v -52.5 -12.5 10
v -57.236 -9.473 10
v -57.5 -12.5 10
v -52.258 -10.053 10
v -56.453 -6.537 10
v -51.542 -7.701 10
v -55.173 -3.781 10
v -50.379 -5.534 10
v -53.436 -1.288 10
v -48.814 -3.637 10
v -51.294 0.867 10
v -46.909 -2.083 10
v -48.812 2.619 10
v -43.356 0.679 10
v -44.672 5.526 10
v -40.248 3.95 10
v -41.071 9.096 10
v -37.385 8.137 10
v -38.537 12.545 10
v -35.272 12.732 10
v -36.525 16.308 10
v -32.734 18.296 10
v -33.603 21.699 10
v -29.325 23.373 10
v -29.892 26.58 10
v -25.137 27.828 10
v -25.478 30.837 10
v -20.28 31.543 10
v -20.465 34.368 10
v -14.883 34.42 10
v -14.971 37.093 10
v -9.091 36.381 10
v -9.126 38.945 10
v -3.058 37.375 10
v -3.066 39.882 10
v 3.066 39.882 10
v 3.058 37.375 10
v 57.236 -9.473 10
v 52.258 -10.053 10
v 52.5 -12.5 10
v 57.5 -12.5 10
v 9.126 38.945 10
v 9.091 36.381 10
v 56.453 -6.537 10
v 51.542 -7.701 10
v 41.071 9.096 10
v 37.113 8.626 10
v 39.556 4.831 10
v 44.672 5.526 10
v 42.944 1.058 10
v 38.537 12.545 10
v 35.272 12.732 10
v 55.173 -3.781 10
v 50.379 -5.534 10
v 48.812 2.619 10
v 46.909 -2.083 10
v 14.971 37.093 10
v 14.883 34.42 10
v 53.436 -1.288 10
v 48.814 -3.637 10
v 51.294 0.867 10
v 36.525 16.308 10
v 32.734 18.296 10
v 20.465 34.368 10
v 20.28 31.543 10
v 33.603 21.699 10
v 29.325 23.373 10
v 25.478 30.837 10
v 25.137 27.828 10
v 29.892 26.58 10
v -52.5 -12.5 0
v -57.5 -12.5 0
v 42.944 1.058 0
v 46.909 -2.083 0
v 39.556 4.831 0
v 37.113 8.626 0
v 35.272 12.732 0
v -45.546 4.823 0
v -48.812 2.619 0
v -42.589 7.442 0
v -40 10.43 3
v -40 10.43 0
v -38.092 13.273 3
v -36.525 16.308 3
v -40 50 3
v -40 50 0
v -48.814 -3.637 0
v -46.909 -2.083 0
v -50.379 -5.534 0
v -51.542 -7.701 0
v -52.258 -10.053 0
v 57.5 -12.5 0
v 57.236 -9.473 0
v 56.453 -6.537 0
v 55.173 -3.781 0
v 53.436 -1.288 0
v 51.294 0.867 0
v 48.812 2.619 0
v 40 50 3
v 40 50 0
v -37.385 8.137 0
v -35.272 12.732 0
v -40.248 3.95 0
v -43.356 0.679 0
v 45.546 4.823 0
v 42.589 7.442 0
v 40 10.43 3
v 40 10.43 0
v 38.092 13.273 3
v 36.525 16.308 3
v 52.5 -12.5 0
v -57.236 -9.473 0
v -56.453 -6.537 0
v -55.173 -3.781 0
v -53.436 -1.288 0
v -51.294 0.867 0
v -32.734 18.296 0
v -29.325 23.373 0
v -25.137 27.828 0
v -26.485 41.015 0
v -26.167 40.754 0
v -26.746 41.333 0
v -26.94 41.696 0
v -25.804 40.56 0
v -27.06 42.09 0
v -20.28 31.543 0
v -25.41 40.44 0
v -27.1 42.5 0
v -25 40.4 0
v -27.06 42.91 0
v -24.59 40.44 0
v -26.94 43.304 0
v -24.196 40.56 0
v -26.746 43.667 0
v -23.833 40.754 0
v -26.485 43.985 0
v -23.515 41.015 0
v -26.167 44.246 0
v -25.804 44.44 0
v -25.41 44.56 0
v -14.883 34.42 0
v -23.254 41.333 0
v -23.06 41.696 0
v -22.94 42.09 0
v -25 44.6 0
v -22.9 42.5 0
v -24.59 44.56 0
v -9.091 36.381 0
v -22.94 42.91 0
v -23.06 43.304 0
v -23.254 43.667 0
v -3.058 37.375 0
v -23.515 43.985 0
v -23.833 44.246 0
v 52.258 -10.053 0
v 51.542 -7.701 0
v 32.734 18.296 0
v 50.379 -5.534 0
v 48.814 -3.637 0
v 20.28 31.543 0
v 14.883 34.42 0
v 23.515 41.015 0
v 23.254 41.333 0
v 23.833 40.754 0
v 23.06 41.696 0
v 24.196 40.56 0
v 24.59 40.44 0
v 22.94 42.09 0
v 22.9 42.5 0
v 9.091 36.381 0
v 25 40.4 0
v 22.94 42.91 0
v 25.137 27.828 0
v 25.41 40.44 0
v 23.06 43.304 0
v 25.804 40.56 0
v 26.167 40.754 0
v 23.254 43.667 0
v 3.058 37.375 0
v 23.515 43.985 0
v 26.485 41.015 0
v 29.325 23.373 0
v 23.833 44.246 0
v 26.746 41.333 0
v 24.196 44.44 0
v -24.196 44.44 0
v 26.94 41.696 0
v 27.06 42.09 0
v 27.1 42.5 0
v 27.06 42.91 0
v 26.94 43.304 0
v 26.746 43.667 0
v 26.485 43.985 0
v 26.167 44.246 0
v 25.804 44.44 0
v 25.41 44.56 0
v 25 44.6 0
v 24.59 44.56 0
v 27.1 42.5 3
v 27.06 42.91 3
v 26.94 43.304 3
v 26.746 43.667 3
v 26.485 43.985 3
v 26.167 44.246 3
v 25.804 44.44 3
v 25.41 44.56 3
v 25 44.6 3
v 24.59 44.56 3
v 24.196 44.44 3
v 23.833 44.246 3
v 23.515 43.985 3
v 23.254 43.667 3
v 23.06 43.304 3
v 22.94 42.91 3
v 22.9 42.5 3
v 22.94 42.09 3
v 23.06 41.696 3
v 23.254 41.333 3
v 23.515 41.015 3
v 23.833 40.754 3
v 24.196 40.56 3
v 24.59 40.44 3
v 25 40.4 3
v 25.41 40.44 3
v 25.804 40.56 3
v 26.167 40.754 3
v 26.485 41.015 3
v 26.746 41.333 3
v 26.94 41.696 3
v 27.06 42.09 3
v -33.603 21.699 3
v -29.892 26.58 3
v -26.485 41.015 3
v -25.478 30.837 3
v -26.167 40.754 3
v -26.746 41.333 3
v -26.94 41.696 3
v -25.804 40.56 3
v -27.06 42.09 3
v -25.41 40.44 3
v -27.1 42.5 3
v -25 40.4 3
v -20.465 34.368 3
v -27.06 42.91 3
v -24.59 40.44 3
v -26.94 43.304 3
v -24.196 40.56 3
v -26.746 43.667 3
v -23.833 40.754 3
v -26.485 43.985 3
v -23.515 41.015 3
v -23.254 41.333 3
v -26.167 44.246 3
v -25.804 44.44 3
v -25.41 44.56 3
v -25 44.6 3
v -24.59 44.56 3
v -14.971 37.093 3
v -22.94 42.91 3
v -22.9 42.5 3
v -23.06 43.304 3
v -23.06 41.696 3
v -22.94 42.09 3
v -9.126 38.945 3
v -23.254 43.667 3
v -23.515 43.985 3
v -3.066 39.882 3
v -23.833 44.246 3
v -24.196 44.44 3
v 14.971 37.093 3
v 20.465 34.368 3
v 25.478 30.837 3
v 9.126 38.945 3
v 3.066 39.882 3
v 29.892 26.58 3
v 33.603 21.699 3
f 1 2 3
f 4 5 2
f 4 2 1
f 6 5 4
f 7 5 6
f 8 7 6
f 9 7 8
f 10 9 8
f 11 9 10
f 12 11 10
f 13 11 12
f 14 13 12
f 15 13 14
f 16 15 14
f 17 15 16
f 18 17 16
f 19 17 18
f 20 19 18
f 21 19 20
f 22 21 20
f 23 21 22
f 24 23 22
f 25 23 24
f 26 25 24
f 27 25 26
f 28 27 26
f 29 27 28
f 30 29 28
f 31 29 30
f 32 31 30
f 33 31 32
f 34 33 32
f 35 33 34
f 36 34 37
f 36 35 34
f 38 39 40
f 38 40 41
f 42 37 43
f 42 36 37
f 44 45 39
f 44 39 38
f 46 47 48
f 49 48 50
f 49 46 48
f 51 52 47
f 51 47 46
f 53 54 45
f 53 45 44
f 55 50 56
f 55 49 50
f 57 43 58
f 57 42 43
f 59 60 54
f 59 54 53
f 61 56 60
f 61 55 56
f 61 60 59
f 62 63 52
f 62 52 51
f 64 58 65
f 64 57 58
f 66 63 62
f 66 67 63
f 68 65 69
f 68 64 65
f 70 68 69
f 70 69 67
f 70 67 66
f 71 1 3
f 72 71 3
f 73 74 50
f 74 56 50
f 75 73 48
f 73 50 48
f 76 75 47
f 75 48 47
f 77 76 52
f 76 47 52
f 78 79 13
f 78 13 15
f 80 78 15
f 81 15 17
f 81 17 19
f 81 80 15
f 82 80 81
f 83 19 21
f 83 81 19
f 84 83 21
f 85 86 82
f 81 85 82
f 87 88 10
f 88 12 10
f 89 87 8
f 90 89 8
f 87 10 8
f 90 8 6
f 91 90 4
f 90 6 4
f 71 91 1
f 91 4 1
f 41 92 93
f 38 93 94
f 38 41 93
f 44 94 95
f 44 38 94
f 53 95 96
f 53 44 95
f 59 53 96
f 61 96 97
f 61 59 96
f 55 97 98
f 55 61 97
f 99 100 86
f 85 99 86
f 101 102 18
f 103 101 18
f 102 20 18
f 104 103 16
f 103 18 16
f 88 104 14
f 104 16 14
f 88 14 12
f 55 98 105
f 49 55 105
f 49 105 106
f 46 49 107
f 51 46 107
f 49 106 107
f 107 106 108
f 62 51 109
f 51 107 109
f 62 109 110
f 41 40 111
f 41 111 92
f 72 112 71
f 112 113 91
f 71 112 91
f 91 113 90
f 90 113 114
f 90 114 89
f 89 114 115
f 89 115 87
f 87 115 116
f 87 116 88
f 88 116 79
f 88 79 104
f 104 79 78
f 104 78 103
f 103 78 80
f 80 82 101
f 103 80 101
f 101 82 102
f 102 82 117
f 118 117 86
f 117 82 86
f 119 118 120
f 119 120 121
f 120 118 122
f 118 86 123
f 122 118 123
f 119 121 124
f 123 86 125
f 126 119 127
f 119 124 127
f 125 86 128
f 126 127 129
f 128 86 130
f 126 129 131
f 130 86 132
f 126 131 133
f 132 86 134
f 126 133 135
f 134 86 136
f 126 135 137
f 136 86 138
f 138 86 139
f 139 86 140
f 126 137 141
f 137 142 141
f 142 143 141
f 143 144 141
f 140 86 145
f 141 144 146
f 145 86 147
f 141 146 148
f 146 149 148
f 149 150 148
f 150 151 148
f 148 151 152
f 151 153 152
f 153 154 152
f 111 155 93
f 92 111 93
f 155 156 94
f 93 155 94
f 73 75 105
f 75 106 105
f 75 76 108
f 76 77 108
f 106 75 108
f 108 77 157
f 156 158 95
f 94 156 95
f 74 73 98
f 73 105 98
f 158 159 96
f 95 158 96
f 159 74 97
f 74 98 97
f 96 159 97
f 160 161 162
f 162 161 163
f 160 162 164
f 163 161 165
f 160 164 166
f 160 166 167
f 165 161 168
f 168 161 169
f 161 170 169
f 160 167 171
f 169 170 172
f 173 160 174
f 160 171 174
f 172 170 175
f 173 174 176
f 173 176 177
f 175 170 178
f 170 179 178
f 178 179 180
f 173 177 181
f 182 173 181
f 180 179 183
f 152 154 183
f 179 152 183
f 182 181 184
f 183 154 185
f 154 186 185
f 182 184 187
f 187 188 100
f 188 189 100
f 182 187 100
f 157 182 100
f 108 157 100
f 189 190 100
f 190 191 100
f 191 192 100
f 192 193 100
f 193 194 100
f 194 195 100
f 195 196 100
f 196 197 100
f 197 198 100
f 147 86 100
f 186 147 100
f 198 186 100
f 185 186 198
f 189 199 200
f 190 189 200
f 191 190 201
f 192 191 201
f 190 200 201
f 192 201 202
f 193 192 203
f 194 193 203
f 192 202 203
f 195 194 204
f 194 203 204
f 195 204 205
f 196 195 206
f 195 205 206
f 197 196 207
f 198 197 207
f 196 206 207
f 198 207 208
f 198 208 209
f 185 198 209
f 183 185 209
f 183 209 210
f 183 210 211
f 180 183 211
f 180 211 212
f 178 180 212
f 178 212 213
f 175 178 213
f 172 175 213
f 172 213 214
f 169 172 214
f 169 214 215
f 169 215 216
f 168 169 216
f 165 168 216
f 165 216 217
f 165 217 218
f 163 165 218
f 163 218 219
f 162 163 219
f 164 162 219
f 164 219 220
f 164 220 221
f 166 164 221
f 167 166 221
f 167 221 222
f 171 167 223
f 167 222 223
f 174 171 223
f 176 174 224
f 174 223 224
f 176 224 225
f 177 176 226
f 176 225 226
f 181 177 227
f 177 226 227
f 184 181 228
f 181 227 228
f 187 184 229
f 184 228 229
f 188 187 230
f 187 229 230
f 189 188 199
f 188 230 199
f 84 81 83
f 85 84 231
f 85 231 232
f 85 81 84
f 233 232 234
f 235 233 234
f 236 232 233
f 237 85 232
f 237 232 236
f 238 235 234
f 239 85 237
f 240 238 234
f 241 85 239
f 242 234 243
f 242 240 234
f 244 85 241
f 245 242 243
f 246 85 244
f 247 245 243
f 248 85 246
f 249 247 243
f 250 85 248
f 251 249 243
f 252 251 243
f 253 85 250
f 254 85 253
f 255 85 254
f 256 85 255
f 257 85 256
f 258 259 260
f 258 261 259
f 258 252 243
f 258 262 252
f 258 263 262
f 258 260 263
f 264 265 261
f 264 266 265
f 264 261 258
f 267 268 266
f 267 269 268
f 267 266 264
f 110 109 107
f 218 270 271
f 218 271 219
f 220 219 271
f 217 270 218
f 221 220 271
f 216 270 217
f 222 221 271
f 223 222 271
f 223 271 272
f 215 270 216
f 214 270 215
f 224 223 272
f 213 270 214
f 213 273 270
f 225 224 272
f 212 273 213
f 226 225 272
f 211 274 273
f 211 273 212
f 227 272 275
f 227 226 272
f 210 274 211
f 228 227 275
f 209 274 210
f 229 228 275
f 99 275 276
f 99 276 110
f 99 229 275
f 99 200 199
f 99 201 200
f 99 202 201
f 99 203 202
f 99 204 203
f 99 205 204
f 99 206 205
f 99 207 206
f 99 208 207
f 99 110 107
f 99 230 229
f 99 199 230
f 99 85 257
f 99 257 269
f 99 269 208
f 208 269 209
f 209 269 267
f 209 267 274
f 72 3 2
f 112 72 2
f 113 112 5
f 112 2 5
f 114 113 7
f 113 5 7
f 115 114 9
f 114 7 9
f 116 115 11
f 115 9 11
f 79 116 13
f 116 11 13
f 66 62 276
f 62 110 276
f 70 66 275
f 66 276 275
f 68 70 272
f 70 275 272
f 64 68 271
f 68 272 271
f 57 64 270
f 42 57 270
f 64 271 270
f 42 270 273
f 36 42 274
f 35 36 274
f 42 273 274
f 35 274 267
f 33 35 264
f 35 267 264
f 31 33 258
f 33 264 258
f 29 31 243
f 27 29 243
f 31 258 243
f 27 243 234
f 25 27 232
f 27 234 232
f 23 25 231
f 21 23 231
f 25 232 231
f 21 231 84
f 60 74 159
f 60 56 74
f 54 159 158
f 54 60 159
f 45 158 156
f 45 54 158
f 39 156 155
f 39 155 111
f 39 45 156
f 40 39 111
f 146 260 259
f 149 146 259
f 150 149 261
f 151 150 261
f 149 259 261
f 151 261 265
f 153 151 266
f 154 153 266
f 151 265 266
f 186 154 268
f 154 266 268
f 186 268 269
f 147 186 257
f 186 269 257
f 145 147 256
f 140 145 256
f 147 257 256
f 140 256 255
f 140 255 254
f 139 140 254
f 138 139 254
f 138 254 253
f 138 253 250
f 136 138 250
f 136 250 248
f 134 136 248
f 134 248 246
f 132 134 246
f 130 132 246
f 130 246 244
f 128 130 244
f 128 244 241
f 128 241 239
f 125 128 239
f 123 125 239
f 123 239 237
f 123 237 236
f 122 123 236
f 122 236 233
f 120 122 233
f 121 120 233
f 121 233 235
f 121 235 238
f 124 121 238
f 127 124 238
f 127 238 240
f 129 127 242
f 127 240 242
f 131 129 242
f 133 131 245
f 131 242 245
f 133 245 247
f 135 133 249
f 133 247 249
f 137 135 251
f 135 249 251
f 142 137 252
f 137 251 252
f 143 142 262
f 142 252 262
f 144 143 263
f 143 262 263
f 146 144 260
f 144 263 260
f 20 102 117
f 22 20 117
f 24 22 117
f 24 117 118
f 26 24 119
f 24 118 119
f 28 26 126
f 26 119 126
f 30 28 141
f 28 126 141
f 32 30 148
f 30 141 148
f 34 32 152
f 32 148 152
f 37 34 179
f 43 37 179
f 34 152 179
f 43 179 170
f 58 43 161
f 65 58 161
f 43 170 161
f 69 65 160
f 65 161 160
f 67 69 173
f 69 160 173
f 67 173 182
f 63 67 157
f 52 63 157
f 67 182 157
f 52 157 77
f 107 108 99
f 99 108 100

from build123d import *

# Parameters (mm, degrees)
EXTRUDE_1_DEPTH     = 10
EXTRUDE_2_DEPTH     = 3
SKETCH_3_R          = 2.1
CUT_EXTRUDE_1_DEPTH = 65.41273166075166
EXTRUDE_START       = -10
EXTRUDE_5_DEPTH     = 10
FILLET_1_R          = 30
FILLET_2_R          = 30


with BuildPart() as part:
    # 草圖1 → 填料-伸長1 (new body)
    with BuildSketch(Plane.XY):
        with BuildLine():
            Line((-39.999999999999964, -7.633e-14), (-37.499999999999964, -7.633e-14))
            ThreePointArc((-37.499999999999964, -7.633e-14), (-4.02e-14, 37.499999999999964), (37.5, 0))
            Line((37.5, 0), (40, 0))
            ThreePointArc((40, 0), (-4.288e-14, 39.999999999999964), (-39.999999999999964, -7.633e-14))
        make_face()
    extrude(amount=EXTRUDE_1_DEPTH)

    # 草圖2 → 填料-伸長2 (add)
    with BuildSketch(Plane(origin=(0, 0, 0), x_dir=(-1, 0, 0), z_dir=(0, 0, -1))):
        with BuildLine():
            Line((-39.99999999999998, -2.7932e-13), (-40, 50))
            Line((-40, 50), (40, 50))
            Line((40, 50), (39.999999999999964, -7.633e-14))
            ThreePointArc((39.999999999999964, -7.633e-14), (-1.1393e-13, 39.99999999999998), (-39.99999999999998, -2.7932e-13))
        make_face()
    extrude(amount=-EXTRUDE_2_DEPTH)

    # 草圖3 → 除料-伸長1 (cut, through all)
    with BuildSketch(Plane.XY.offset(3)):
        with Locations((-25, 42.5)):
            Circle(SKETCH_3_R)
        with Locations((25, 42.5)):
            Circle(SKETCH_3_R)
    extrude(amount=-CUT_EXTRUDE_1_DEPTH, mode=Mode.SUBTRACT)

    # 草圖4 → 填料-伸長5 (add)
    with BuildSketch(Plane(origin=(0, 0, 0), x_dir=(-1, 0, 0), z_dir=(0, 0, -1)).offset(EXTRUDE_START)):
        with BuildLine():
            Line((52.49999999999998, -12.500000000000076), (57.49999999999997, -12.500000000000076))
            ThreePointArc((57.49999999999997, -12.500000000000076), (52.37436867076461, -0.12563132923555287), (40.00000000000013, 4.999999999999924))
            Line((39.999999999999964, 4.999999999999924), (39.999999999999964, -7.633e-14))
            ThreePointArc((39.999999999999964, -7.461e-14), (48.83883476483181, -3.6611652351682356), (52.49999999999998, -12.500000000000078))
        make_face()
        with BuildLine():
            Line((39.999999999999964, -7.633e-14), (39.999999999999964, 4.999999999999924))
            ThreePointArc((40.00000000000013, 4.999999999999924), (39.84330526776641, 4.999298464821022), (39.686623098603214, 4.9971939155302305))
            ThreePointArc((39.68662309860321, 4.997193915530231), (39.92157890129177, 2.5035051483740323), (39.99999999999996, -2.809e-14))
        make_face()
    extrude_5 = extrude(amount=EXTRUDE_5_DEPTH)

    # 鏡射1: 填料-伸長5 across plane
    add(extrude_5.mirror(Plane(origin=(0, 0, 0), x_dir=(0, 0, 1), z_dir=(1, 0, 0))))

    # 圓角1
    fillet_1_edges = [part.edges().sort_by_distance(p)[0] for p in [
        (37.5, 4.27e-15, 5),
        (-37.49999999999997, -7.633e-14, 5),
    ]]
    fillet(fillet_1_edges, radius=FILLET_1_R)

    # 圓角2
    fillet_2_edges = [part.edges().sort_by_distance(p)[0] for p in [
        (-39.68662309860321, 4.997193915530232, 6.5),
        (39.68662309860321, 4.997193915530232, 6.5),
    ]]
    fillet(fillet_2_edges, radius=FILLET_2_R)


solid = part.part
